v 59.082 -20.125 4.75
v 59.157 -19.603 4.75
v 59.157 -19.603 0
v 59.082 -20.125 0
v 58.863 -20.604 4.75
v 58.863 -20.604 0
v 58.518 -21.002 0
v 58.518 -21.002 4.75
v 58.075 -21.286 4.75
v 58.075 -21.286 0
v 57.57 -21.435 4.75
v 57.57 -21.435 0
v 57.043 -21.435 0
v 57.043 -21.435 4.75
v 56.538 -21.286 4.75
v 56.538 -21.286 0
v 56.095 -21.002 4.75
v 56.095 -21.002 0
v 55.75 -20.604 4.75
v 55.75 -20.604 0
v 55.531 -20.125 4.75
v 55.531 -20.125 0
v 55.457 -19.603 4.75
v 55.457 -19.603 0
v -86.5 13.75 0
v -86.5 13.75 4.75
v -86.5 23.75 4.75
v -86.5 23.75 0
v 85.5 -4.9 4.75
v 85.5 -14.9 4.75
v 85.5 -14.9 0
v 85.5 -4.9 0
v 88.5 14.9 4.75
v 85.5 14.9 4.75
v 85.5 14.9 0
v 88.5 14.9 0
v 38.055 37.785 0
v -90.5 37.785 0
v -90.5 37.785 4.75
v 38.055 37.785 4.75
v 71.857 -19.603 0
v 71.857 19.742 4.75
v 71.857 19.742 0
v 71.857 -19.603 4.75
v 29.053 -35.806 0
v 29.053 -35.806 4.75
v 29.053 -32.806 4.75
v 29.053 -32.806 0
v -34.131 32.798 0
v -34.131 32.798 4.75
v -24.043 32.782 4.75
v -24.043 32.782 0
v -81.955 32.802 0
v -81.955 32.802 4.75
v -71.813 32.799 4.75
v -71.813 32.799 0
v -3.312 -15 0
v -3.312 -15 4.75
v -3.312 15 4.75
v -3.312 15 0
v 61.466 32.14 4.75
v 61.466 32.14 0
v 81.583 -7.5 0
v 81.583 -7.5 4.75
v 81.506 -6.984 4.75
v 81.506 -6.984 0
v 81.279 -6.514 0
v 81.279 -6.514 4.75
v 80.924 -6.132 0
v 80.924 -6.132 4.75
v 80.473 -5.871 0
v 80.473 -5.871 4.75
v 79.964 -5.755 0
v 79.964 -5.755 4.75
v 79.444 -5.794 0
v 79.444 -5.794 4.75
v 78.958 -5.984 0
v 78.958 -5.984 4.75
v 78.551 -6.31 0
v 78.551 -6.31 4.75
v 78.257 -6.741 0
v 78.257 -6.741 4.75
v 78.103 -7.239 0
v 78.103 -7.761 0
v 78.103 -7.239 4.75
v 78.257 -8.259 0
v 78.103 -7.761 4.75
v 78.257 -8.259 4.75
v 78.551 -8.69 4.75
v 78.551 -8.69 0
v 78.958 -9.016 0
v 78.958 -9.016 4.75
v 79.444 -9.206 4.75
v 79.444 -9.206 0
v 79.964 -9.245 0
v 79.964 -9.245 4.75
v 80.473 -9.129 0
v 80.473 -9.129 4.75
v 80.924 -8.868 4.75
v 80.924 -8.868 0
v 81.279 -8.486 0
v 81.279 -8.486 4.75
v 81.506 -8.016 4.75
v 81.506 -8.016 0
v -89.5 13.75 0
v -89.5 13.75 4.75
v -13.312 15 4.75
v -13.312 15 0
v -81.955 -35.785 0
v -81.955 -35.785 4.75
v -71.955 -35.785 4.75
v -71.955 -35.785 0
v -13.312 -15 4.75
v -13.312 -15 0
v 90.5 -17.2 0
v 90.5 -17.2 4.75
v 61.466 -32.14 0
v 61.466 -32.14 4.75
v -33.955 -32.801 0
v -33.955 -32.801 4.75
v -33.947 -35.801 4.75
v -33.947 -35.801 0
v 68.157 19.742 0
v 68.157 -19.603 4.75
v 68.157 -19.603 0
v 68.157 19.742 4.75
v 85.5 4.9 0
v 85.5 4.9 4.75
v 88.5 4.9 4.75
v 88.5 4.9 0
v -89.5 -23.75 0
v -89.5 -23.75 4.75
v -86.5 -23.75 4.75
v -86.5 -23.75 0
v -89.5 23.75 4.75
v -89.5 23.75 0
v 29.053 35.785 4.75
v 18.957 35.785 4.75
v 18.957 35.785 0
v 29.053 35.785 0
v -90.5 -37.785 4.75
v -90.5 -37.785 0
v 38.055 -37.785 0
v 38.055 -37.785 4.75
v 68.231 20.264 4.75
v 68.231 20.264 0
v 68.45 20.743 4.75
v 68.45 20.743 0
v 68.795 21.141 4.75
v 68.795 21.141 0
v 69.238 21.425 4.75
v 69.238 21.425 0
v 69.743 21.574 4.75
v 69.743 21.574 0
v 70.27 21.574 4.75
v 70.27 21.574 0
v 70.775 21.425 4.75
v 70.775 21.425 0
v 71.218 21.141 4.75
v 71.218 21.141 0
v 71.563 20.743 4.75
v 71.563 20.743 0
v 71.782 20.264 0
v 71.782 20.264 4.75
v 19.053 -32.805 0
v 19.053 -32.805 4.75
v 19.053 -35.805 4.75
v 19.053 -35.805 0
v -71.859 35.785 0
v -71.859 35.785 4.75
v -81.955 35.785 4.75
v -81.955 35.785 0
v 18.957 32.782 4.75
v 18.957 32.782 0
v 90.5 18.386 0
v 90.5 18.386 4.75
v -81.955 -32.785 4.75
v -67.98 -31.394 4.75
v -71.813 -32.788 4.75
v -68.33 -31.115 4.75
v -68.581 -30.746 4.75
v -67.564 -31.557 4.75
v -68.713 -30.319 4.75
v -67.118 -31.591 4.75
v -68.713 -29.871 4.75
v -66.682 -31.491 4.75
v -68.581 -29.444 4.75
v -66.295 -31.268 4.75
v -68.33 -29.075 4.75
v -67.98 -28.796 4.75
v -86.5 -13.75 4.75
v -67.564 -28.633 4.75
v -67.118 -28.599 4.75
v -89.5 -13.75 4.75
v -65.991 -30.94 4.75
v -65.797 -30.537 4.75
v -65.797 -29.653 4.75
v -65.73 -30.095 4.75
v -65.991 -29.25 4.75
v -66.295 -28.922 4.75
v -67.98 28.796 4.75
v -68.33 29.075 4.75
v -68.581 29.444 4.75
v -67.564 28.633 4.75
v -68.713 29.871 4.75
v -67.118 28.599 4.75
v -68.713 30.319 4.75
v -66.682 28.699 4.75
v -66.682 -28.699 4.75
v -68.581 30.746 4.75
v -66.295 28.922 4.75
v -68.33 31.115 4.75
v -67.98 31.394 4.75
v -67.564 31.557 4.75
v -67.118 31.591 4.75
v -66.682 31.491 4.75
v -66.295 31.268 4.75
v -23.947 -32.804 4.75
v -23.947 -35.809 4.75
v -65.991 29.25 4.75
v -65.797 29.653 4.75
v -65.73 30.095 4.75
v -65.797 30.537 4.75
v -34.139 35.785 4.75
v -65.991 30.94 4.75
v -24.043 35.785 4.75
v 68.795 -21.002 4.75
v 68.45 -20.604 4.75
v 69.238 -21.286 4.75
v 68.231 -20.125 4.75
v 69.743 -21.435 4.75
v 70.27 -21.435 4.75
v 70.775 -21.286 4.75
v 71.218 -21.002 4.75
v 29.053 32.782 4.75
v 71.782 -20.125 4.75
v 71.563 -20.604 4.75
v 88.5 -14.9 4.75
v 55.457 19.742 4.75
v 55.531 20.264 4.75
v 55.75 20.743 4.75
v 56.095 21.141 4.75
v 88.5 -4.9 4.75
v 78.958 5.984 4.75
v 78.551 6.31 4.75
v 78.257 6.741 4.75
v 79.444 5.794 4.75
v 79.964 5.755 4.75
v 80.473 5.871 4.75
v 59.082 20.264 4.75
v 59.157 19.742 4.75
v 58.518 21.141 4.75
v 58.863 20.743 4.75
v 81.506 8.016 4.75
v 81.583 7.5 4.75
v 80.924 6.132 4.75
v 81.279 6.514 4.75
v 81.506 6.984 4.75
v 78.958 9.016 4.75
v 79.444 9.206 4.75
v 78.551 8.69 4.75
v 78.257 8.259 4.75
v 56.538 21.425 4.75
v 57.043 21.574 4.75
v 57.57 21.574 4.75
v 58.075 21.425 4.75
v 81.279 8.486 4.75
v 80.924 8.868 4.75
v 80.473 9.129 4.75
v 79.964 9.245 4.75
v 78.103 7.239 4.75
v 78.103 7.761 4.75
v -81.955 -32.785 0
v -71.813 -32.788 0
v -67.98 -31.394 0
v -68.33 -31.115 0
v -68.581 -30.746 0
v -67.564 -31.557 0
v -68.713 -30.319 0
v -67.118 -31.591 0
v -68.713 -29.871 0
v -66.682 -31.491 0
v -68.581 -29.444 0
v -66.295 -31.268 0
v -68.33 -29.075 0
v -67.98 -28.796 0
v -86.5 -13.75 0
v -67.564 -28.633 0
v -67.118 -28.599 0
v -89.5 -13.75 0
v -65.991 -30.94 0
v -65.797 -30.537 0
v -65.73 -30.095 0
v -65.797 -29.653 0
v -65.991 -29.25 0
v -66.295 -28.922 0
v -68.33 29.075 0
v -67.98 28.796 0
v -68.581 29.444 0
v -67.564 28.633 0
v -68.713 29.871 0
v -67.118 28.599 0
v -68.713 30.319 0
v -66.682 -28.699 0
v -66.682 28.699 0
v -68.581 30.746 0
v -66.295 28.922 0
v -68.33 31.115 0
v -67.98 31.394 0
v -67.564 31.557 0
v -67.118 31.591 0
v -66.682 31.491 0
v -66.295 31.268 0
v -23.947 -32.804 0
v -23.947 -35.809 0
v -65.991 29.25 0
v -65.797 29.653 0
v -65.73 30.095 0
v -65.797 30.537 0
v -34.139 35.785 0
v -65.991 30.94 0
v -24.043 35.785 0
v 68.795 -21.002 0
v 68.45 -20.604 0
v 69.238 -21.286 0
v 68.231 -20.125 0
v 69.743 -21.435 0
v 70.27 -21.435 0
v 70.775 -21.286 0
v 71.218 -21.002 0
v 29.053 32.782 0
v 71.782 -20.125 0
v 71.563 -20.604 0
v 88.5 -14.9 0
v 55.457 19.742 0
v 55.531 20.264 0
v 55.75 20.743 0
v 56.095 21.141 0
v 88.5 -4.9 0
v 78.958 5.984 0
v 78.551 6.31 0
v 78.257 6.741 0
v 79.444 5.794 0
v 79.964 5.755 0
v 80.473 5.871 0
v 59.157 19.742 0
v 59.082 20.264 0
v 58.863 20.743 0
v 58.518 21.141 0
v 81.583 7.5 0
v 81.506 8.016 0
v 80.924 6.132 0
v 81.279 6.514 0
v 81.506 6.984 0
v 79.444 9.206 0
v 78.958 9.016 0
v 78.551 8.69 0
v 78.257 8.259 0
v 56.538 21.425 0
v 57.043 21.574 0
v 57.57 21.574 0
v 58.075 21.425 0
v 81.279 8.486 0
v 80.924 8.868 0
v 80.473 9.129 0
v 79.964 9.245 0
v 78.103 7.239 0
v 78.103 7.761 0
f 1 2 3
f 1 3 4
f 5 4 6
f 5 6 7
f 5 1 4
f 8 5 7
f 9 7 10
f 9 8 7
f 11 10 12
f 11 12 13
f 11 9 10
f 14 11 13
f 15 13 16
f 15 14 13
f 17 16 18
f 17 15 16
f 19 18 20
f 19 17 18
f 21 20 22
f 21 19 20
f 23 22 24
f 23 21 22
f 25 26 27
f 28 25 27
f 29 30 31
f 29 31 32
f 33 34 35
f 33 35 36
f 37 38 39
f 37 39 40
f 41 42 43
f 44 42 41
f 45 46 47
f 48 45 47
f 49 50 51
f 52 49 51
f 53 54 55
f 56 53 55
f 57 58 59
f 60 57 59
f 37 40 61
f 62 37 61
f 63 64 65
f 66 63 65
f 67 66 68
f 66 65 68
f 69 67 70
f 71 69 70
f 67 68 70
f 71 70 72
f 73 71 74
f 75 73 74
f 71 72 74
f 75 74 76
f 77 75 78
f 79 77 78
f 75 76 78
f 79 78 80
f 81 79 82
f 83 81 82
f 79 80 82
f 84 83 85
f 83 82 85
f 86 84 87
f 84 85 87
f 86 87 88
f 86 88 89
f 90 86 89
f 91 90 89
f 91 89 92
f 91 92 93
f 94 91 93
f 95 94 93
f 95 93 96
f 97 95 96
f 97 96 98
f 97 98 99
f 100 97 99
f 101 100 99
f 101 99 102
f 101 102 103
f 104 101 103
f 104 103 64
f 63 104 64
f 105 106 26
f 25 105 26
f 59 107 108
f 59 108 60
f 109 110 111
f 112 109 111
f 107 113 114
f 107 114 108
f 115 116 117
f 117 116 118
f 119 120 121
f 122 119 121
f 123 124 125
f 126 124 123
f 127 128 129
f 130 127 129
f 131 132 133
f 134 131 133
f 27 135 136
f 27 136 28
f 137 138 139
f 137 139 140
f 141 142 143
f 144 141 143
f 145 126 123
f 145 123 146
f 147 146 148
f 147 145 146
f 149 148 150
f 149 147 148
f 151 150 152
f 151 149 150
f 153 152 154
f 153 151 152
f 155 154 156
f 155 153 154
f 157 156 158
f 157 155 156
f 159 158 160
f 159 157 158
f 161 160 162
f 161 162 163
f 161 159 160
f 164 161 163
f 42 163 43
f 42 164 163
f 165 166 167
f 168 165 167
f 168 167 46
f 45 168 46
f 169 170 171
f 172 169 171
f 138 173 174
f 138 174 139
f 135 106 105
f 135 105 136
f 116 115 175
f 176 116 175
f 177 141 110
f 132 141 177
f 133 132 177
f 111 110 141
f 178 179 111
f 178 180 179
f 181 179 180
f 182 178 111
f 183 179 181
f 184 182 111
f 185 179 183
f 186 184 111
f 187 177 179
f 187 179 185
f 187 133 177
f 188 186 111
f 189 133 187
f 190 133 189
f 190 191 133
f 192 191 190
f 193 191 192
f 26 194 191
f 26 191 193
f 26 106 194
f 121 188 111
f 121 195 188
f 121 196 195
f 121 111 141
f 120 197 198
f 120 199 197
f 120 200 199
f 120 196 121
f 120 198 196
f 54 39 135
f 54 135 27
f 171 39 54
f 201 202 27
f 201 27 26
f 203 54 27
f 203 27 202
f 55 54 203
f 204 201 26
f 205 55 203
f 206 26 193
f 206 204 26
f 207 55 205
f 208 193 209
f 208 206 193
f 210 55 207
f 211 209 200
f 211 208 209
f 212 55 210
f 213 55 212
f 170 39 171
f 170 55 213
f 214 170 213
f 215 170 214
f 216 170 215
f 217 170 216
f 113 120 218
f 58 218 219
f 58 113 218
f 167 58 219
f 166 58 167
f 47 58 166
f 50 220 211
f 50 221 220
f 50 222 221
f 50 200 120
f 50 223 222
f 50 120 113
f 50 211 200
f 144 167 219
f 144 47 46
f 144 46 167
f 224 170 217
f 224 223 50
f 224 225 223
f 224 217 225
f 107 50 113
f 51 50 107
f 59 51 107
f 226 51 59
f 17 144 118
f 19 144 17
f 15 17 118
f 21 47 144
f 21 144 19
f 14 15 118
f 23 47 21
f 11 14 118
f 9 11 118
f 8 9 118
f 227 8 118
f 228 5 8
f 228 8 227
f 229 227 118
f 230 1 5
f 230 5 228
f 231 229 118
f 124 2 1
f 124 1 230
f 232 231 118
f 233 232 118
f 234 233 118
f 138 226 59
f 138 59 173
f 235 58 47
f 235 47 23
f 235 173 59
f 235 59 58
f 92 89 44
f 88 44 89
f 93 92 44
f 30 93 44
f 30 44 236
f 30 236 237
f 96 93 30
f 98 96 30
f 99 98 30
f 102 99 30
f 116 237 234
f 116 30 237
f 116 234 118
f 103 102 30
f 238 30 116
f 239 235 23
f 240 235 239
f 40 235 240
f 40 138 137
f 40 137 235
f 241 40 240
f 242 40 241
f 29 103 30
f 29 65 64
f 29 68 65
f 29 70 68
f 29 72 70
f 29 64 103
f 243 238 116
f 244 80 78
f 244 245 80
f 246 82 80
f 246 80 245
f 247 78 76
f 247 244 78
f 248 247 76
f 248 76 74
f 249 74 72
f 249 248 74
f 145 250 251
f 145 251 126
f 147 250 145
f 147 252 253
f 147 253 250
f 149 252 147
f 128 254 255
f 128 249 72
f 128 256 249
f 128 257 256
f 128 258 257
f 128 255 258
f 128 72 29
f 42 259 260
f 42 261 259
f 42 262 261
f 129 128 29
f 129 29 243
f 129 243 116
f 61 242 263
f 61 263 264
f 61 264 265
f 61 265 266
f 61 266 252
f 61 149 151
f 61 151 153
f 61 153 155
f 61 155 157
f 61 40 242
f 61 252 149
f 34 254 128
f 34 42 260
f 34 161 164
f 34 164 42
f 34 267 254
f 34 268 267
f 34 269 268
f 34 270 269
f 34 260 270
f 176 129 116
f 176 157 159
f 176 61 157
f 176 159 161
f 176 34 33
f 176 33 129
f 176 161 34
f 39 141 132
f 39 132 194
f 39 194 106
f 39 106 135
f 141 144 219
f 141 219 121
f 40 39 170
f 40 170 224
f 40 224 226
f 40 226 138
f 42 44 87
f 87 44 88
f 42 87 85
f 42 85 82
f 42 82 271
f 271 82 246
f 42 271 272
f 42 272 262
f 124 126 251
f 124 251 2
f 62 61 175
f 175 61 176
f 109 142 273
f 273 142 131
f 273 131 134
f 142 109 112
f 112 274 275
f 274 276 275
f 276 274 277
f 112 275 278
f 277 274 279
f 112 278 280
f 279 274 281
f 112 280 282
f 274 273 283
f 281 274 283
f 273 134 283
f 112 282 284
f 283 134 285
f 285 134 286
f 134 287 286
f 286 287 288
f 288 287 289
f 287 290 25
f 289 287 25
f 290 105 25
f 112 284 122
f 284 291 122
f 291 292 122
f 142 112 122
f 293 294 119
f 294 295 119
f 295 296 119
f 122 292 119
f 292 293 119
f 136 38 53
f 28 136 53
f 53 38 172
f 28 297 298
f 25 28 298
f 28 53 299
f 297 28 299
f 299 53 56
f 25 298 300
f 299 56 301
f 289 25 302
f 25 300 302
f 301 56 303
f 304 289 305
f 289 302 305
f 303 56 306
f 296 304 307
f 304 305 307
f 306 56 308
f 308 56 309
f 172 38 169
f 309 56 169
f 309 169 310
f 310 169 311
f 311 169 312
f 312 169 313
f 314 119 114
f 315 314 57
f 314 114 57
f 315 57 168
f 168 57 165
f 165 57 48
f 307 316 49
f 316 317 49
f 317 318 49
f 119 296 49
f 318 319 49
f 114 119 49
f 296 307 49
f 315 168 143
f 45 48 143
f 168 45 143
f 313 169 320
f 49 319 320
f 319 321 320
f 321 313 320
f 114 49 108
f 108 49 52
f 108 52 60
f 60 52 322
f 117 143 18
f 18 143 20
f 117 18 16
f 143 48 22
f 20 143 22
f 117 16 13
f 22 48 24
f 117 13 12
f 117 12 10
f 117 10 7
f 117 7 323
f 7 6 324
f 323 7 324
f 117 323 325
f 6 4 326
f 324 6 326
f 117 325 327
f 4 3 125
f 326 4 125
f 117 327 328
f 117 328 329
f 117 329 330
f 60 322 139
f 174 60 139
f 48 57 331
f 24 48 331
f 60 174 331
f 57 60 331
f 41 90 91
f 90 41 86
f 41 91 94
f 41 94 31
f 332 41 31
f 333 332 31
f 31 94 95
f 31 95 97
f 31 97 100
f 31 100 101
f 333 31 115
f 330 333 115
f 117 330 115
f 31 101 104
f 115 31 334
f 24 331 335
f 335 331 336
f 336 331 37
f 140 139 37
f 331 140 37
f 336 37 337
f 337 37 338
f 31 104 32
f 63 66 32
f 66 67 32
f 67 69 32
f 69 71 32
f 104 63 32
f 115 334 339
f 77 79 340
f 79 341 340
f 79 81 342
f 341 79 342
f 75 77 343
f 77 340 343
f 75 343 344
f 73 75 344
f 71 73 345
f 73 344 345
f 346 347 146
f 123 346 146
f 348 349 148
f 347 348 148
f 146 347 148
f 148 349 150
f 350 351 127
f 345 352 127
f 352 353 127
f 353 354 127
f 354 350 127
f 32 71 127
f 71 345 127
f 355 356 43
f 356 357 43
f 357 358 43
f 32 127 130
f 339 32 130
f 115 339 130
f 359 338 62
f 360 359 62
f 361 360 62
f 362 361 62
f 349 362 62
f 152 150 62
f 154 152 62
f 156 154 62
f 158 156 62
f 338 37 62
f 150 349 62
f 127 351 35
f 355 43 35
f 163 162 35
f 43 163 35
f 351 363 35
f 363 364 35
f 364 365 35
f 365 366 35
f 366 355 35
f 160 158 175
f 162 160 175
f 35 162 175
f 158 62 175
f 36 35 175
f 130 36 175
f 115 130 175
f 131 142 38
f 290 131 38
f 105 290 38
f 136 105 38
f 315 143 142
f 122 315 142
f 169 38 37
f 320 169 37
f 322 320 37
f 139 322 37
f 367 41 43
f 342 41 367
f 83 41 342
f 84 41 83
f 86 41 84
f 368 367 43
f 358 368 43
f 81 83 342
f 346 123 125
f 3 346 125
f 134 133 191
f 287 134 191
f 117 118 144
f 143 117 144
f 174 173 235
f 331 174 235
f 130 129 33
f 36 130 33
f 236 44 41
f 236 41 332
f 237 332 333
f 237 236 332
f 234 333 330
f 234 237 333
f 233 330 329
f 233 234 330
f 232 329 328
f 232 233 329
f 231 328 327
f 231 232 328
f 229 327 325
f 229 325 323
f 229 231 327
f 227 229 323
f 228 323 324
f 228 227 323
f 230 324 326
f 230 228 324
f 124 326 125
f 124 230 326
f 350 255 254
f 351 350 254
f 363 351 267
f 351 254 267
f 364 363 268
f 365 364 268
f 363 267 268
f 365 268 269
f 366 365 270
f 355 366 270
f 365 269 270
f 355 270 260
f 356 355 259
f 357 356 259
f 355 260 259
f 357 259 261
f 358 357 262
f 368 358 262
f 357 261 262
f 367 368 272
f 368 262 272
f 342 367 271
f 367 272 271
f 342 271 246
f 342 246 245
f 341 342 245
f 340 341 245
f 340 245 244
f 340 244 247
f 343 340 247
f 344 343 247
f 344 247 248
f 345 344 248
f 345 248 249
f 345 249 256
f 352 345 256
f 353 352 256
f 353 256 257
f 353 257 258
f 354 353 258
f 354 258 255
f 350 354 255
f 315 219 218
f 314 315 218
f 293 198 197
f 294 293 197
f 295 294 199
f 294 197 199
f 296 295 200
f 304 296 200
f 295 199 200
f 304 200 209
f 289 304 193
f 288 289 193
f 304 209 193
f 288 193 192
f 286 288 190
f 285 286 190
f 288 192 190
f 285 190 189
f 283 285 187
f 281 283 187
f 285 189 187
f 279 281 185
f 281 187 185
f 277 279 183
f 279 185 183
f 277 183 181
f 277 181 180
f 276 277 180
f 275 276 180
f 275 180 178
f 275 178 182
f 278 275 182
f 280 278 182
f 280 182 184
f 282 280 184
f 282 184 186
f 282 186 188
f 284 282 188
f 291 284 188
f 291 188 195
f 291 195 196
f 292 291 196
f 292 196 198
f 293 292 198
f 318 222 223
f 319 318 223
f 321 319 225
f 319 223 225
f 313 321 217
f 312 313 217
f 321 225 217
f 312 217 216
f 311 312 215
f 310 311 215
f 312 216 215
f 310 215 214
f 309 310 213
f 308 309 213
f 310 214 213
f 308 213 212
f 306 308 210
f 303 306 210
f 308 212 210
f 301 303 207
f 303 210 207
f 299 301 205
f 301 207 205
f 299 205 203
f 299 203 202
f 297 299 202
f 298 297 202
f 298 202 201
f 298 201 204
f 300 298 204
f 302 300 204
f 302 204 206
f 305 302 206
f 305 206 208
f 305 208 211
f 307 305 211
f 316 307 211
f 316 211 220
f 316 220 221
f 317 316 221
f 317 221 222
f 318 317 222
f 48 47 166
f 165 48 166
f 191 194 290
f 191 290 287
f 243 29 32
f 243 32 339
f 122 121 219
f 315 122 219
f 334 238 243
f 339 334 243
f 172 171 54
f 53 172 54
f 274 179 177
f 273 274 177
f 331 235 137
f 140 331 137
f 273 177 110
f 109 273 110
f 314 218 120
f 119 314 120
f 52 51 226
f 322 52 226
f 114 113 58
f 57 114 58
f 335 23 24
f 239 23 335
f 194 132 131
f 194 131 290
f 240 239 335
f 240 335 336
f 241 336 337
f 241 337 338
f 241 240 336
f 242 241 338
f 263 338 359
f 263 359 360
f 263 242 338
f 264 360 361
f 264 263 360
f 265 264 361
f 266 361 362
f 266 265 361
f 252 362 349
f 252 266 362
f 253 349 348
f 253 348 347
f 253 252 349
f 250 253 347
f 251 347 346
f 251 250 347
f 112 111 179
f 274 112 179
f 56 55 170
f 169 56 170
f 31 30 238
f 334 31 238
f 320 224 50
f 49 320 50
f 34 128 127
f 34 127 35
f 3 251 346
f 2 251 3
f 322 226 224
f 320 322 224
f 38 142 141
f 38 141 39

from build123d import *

# Parameters (mm, degrees)
SKETCH1_W           = 181
SKETCH1_H           = 75.57
BOSS_EXTRUDE2_DEPTH = 4.75
SKETCH6_W           = 3
SKETCH6_H           = 10
SKETCH6_W_2         = 10.095812656
SKETCH6_H_2         = 3.003442242
SKETCH6_W_3         = 10
SKETCH6_H_3         = 30
SKETCH6_R           = 1.5
SKETCH6_R_2         = 1.85
SKETCH6_R_3         = 1.75
CUT_EXTRUDE7_DEPTH  = 9
CUT_EXTRUDE8_DEPTH  = 4.75


with BuildPart() as part:
    # Sketch1 → Boss-Extrude2 (new body)
    with BuildSketch(Plane.XY):
        Rectangle(SKETCH1_W, SKETCH1_H)
    extrude(amount=BOSS_EXTRUDE2_DEPTH)

    # Sketch6 → Cut-Extrude7 (cut)
    with BuildSketch(Plane.XY.offset(4.75)):
        Polygon((-81.955185068, 35.785), (-81.955183992, 32.802018857), (-71.81277502, 32.798644215), (-71.859372412, 35.785), align=None)
        with Locations((-88, 18.75)):
            Rectangle(SKETCH6_W, SKETCH6_H)
        with Locations((-88, -18.75)):
            Rectangle(SKETCH6_W, SKETCH6_H)
        Polygon((-34.13878131, 35.785), (-34.130786214, 32.798291399), (-24.042968654, 32.781557758), (-24.042968654, 35.785), align=None)
        Polygon((-71.81277502, -32.788413815), (-81.955183992, -32.785039173), (-81.955181828, -35.785039173), (-71.955181828, -35.785031959), align=None)
        Polygon((-33.95518398, -32.801010013), (-33.947153334, -35.800999264), (-23.947156396, -35.808824865), (-23.946905936, -32.804340026), align=None)
        with Locations((87, 9.9)):
            Rectangle(SKETCH6_W, SKETCH6_H)
        with Locations((24.004937674, 34.283278879)):
            Rectangle(SKETCH6_W_2, SKETCH6_H_2)
        Polygon((29.052844002, -32.806257253), (19.053094123, -32.805423656), (19.052844037, -35.805423646), (29.052844002, -35.806257264), align=None)
        with Locations((-8.31156853, 0)):
            Rectangle(SKETCH6_W_3, SKETCH6_H_3)
        with Locations((87, -9.9)):
            Rectangle(SKETCH6_W, SKETCH6_H)
        Polygon((61.466273892, -32.14), (38.055212144, -37.785), (90.5, -37.785), (90.5, -17.2), align=None)
        Polygon((61.46627389, 32.14), (90.5, 18.385572572), (90.5, 37.785), (38.055212144, 37.785), align=None)
        with Locations((-67.23, 30.095)):
            Circle(SKETCH6_R)
        with Locations((-67.23, -30.095)):
            Circle(SKETCH6_R)
        with Locations((70.00651733, -12.753407437)):
            Circle(SKETCH6_R_2)
        with Locations((70.00651733, 12.892480558)):
            Circle(SKETCH6_R_2)
        with Locations((70.00651733, 0)):
            Circle(SKETCH6_R_2)
        with Locations((57.30651733, 12.892480558)):
            Circle(SKETCH6_R_2)
        with Locations((57.30651733, 0)):
            Circle(SKETCH6_R_2)
        with Locations((57.30651733, -12.753407437)):
            Circle(SKETCH6_R_2)
        with Locations((79.833359723, -7.5)):
            Circle(SKETCH6_R_3)
        with Locations((79.833359723, 7.5)):
            Circle(SKETCH6_R_3)
    extrude(amount=-CUT_EXTRUDE7_DEPTH, mode=Mode.SUBTRACT)

    # Sketch9 → Cut-Extrude8 (cut)
    with BuildSketch(Plane.XY.offset(4.75)):
        with BuildLine():
            Line((59.15651733, 19.742480558), (59.15651733, -19.603407437))
            ThreePointArc((59.15651733, -19.603407437), (57.30651733, -21.453407437), (55.45651733, -19.603407437))
            Line((55.45651733, -19.603407437), (55.45651733, 19.742480558))
            ThreePointArc((55.45651733, 19.742480558), (57.30651733, 21.592480558), (59.15651733, 19.742480558))
        make_face()
        with BuildLine():
            Line((71.85651733, 19.742480558), (71.85651733, -19.603407437))
            ThreePointArc((71.85651733, -19.603407437), (70.00651733, -21.453407437), (68.15651733, -19.603407437))
            Line((68.15651733, -19.603407437), (68.15651733, 19.742480558))
            ThreePointArc((68.15651733, 19.742480558), (70.00651733, 21.592480558), (71.85651733, 19.742480558))
        make_face()
    extrude(amount=-CUT_EXTRUDE8_DEPTH, mode=Mode.SUBTRACT)


solid = part.part
